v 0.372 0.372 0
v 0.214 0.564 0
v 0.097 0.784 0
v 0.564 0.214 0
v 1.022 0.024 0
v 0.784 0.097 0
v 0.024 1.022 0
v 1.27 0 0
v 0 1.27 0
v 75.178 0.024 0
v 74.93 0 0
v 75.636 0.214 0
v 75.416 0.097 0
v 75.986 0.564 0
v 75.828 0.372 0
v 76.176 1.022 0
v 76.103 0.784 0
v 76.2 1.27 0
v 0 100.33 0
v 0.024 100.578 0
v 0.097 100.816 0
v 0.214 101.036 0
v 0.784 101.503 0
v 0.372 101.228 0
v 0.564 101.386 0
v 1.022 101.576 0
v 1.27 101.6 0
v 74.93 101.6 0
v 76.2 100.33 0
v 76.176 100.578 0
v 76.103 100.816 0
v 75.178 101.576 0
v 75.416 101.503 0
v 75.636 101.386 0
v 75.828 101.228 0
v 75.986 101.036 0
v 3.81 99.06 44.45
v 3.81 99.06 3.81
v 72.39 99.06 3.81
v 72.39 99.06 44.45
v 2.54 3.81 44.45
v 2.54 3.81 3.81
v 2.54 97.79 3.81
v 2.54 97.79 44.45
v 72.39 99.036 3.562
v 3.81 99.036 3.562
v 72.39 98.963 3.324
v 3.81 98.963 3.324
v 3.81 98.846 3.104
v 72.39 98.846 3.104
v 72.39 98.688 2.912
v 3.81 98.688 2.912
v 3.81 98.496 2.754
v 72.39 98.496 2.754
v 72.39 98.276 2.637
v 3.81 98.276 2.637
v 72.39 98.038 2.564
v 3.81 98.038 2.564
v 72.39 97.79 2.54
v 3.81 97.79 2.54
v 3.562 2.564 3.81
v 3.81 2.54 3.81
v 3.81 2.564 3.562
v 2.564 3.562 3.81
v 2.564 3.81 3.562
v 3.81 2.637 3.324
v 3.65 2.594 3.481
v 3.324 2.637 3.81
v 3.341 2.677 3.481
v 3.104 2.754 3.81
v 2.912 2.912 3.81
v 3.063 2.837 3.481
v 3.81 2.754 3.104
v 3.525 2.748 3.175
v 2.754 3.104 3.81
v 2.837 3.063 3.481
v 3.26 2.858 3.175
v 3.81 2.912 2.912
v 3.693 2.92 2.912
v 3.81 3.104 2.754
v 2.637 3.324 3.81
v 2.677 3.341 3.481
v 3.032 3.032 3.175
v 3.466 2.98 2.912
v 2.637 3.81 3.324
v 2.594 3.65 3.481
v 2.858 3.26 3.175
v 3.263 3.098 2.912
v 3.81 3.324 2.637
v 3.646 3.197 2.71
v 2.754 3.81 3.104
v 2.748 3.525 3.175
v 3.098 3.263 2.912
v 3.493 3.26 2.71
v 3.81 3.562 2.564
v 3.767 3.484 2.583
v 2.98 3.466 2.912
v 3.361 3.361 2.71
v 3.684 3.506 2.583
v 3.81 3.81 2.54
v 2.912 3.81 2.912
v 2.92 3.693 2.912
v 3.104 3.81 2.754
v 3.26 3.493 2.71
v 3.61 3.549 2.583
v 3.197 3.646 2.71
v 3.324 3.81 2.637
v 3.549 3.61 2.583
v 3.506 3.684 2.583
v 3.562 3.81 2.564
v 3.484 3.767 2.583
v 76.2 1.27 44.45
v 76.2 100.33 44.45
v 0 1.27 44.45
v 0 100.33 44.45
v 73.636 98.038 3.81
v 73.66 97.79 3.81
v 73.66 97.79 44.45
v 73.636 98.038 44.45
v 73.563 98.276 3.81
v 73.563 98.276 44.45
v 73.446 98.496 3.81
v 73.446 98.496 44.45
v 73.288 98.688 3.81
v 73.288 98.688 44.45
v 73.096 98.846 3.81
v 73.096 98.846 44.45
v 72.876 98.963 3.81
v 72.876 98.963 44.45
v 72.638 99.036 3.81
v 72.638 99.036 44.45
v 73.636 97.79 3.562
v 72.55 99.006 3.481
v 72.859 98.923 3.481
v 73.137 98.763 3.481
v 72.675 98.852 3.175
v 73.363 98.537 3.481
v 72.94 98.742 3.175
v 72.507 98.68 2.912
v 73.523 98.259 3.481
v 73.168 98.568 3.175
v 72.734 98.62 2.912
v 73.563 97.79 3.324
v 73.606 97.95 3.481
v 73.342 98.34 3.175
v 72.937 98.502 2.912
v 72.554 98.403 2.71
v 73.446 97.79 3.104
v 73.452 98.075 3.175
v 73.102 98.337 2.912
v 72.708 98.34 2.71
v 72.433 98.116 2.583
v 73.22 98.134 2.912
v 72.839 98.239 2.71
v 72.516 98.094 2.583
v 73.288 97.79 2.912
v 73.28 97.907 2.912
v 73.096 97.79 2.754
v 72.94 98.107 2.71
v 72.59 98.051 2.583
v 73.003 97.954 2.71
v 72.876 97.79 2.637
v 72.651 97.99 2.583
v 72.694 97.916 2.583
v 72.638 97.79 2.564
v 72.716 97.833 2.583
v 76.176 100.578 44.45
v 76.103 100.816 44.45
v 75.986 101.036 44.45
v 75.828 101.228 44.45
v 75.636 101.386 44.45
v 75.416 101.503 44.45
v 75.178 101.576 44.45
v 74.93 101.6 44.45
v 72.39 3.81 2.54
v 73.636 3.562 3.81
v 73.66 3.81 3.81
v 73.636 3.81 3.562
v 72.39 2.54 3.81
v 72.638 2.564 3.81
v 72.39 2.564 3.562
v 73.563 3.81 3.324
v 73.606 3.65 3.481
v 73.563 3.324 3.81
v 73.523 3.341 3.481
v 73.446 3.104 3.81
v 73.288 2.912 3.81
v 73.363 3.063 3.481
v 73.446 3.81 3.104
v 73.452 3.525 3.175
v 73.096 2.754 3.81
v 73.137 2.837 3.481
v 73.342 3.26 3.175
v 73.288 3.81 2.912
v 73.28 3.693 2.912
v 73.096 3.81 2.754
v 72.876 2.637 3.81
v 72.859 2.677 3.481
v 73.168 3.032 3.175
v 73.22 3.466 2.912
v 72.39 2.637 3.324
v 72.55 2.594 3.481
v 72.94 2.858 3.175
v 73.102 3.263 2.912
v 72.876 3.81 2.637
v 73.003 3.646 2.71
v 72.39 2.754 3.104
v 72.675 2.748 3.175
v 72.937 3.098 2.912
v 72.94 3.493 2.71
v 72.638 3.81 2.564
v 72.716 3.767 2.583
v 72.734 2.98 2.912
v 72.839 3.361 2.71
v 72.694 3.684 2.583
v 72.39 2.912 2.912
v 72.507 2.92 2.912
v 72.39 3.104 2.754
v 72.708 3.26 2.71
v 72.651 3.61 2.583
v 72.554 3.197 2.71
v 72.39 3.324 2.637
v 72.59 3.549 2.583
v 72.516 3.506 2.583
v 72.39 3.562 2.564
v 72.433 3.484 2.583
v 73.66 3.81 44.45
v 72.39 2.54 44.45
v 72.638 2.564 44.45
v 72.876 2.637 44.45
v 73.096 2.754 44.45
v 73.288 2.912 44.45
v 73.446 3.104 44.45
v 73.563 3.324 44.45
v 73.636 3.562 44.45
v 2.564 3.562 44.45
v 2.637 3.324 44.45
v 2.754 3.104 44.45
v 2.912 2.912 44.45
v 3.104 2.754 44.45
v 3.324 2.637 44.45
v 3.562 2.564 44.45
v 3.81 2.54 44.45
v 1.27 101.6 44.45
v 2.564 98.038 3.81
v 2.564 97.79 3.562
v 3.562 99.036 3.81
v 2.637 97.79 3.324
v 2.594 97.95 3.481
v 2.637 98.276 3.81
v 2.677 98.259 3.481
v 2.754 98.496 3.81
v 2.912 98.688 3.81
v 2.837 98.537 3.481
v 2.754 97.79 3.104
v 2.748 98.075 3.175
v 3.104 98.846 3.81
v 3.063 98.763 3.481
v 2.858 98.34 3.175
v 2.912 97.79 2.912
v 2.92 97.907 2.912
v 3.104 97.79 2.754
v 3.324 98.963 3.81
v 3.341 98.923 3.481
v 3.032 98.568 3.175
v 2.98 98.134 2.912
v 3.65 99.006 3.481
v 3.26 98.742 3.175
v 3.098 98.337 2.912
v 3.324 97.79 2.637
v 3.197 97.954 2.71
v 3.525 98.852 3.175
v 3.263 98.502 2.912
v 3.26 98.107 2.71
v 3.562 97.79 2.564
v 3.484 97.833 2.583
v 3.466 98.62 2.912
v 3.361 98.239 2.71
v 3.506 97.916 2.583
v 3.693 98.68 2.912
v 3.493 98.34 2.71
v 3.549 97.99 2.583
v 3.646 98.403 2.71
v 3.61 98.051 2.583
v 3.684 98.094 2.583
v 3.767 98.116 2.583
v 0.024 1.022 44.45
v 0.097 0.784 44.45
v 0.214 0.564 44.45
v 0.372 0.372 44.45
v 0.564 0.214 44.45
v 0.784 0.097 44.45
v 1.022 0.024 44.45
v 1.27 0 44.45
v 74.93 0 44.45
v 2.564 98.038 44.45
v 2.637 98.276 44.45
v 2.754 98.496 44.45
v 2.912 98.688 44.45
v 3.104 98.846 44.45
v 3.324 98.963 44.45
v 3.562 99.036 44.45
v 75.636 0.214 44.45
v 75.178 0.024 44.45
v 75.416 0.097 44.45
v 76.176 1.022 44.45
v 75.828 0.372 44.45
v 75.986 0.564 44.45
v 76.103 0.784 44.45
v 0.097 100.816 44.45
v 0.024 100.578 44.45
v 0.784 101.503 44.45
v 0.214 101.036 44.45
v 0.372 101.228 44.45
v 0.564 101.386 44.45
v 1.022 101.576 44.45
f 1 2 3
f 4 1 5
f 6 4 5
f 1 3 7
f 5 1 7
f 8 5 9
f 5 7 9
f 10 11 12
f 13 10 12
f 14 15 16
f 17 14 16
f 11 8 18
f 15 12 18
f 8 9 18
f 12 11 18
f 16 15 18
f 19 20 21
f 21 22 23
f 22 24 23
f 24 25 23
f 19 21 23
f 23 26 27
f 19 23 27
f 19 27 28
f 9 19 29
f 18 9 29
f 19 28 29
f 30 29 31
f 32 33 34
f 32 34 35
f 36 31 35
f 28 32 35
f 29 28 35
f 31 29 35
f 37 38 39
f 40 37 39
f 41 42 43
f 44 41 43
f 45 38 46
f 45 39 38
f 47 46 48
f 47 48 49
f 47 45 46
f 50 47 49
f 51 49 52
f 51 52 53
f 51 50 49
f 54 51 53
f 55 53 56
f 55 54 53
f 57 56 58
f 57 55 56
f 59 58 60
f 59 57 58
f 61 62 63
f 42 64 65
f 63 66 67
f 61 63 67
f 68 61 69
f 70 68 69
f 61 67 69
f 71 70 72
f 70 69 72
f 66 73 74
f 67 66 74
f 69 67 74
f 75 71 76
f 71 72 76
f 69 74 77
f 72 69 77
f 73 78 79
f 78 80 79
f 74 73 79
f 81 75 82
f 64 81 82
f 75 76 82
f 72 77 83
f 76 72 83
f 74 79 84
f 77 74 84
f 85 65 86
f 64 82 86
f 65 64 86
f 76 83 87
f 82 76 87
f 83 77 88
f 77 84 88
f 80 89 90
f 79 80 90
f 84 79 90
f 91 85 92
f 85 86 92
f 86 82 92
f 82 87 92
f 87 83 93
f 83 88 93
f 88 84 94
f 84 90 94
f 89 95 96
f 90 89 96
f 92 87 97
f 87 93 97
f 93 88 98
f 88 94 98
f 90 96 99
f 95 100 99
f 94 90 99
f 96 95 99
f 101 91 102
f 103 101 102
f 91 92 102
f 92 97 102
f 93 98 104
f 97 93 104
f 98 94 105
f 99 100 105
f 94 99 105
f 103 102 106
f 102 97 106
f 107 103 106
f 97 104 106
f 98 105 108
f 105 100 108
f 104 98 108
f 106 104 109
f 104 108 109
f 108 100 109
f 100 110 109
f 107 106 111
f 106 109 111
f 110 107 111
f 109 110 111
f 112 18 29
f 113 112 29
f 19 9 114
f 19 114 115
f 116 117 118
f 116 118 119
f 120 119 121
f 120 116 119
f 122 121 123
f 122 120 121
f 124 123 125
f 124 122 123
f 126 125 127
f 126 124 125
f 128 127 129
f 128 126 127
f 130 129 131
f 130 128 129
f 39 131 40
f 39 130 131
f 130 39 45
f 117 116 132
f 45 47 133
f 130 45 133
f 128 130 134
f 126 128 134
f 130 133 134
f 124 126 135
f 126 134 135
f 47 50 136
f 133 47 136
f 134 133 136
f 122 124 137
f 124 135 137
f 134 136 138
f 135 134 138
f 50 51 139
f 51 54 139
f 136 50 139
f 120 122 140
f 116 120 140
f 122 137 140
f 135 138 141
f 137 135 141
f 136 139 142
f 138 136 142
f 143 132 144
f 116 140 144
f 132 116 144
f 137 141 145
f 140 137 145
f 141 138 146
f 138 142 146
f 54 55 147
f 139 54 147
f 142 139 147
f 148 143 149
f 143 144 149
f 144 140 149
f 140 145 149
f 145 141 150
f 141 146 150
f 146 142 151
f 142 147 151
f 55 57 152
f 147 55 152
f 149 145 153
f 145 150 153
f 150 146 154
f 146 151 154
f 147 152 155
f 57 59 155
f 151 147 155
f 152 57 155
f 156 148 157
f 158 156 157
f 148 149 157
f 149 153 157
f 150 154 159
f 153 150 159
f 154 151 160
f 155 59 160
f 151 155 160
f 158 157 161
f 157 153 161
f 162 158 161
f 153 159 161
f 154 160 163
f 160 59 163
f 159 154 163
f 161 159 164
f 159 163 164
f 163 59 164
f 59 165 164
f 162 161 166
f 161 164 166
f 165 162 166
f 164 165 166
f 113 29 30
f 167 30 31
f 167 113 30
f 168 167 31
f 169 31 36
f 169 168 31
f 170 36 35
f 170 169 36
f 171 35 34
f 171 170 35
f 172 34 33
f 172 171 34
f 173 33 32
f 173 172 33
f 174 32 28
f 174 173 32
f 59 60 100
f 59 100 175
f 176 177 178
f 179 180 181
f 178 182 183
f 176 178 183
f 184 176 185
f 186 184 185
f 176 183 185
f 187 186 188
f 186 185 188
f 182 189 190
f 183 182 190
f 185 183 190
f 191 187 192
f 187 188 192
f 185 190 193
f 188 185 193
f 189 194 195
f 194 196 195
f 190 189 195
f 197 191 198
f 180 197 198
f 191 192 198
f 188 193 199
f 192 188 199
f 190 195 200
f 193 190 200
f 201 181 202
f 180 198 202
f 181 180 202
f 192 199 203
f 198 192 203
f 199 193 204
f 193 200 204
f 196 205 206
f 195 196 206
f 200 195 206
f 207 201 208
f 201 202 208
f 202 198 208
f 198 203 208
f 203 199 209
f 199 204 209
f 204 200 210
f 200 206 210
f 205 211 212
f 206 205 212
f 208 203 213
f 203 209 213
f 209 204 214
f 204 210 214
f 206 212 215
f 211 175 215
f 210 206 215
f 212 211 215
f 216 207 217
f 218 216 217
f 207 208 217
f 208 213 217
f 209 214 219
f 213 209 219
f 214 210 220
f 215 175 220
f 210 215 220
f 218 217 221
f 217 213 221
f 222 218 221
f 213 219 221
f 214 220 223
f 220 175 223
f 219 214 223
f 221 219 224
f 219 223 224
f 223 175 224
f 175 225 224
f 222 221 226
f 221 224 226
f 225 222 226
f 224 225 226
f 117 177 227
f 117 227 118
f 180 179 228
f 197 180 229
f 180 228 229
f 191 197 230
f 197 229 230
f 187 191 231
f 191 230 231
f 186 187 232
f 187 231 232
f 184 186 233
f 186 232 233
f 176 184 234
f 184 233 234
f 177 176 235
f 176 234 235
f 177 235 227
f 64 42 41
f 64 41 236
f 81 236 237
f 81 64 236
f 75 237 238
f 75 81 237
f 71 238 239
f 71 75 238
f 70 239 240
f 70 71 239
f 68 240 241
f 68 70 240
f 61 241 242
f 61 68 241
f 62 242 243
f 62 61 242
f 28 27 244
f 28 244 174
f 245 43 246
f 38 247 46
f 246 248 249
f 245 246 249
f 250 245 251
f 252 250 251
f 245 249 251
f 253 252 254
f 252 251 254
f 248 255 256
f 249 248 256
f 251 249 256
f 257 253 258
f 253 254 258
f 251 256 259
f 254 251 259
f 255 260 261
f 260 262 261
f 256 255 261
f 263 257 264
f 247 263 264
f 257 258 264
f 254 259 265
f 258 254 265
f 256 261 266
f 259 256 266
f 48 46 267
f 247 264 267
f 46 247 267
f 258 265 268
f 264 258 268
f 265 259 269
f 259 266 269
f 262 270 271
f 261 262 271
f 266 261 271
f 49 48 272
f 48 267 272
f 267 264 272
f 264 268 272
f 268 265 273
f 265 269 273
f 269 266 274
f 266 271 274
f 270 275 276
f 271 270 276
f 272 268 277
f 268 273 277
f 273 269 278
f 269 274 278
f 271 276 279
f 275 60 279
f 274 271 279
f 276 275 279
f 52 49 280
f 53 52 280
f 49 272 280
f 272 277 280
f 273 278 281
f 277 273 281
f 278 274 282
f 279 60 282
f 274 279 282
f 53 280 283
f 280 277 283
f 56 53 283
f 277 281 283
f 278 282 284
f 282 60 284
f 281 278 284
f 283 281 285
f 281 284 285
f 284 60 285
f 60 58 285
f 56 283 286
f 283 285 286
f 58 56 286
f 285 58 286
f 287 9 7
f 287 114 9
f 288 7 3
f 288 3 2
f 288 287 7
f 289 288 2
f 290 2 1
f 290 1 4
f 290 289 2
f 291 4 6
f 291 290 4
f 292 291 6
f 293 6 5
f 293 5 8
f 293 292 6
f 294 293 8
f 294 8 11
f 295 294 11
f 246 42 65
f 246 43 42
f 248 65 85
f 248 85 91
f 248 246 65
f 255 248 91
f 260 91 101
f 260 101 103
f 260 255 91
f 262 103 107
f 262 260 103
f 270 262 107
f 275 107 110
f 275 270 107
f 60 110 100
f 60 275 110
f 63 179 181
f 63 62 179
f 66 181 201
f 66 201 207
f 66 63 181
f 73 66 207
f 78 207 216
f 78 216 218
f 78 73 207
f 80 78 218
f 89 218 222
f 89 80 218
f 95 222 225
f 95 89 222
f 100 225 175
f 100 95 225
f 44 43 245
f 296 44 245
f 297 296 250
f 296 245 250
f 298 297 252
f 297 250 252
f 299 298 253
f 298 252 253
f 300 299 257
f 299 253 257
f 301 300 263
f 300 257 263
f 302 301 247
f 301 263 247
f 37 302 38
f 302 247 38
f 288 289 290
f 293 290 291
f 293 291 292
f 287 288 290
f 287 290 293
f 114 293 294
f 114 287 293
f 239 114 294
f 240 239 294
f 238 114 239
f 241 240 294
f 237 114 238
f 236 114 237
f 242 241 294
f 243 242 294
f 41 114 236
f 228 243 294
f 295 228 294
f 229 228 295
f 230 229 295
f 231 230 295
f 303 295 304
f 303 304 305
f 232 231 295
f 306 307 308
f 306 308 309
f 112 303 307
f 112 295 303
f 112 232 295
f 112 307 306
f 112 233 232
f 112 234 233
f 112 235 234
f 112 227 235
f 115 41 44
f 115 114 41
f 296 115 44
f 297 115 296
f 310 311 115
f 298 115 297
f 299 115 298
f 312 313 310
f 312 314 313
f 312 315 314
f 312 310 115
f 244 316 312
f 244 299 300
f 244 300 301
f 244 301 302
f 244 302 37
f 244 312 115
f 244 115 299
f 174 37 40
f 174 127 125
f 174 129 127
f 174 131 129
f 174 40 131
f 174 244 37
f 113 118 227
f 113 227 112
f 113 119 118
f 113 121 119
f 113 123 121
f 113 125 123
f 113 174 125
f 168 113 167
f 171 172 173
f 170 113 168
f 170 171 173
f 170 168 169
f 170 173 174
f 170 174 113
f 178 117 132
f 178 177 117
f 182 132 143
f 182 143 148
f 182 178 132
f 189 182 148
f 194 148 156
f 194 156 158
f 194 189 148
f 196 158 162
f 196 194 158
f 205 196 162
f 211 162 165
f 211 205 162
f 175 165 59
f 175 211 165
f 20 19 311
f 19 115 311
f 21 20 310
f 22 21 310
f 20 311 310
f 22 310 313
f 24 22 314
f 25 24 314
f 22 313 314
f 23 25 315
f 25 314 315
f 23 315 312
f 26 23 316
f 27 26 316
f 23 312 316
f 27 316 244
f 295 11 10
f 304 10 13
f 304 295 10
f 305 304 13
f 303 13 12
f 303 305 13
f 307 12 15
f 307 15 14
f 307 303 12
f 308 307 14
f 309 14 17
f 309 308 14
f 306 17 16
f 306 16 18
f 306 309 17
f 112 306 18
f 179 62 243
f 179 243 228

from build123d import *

# Parameters (mm, degrees)
F0_W     = 76.2
F0_H     = 101.6
F1_DEPTH = 44.45
F2_T     = -2.54
F3_R     = 1.27
F4_R     = 1.27


with BuildPart() as f1:
    # F0 (on Top) → F1 (new body)
    with BuildSketch(Plane.XY):
        with Locations((38.1, 50.8)):
            Rectangle(F0_W, F0_H)
    extrude(amount=F1_DEPTH)

    # F2
    f2_openings = [f1.faces().sort_by_distance(p)[0] for p in [
        (38.1, 50.8, 44.45),
    ]]
    offset(amount=F2_T, openings=f2_openings)

    # F3
    f3_edges = [f1.edges().sort_by_distance(p)[0] for p in [
        (2.54, 2.54, 23.495),
        (2.54, 99.06, 23.495),
        (73.66, 2.54, 23.495),
        (73.66, 99.06, 23.495),
        (0, 0, 22.225),
        (0, 101.6, 22.225),
        (76.2, 0, 22.225),
        (76.2, 101.6, 22.225),
    ]]
    fillet(f3_edges, radius=F3_R)

    # F4
    f4_edges = [f1.edges().sort_by_distance(p)[0] for p in [
        (2.54, 50.8, 2.54),
        (2.911974, 98.688026, 2.54),
        (2.911974, 2.911974, 2.54),
        (38.1, 99.06, 2.54),
        (38.1, 2.54, 2.54),
        (73.288026, 98.688026, 2.54),
        (73.288026, 2.911974, 2.54),
        (73.66, 50.8, 2.54),
    ]]
    fillet(f4_edges, radius=F4_R)


solid = f1.part
